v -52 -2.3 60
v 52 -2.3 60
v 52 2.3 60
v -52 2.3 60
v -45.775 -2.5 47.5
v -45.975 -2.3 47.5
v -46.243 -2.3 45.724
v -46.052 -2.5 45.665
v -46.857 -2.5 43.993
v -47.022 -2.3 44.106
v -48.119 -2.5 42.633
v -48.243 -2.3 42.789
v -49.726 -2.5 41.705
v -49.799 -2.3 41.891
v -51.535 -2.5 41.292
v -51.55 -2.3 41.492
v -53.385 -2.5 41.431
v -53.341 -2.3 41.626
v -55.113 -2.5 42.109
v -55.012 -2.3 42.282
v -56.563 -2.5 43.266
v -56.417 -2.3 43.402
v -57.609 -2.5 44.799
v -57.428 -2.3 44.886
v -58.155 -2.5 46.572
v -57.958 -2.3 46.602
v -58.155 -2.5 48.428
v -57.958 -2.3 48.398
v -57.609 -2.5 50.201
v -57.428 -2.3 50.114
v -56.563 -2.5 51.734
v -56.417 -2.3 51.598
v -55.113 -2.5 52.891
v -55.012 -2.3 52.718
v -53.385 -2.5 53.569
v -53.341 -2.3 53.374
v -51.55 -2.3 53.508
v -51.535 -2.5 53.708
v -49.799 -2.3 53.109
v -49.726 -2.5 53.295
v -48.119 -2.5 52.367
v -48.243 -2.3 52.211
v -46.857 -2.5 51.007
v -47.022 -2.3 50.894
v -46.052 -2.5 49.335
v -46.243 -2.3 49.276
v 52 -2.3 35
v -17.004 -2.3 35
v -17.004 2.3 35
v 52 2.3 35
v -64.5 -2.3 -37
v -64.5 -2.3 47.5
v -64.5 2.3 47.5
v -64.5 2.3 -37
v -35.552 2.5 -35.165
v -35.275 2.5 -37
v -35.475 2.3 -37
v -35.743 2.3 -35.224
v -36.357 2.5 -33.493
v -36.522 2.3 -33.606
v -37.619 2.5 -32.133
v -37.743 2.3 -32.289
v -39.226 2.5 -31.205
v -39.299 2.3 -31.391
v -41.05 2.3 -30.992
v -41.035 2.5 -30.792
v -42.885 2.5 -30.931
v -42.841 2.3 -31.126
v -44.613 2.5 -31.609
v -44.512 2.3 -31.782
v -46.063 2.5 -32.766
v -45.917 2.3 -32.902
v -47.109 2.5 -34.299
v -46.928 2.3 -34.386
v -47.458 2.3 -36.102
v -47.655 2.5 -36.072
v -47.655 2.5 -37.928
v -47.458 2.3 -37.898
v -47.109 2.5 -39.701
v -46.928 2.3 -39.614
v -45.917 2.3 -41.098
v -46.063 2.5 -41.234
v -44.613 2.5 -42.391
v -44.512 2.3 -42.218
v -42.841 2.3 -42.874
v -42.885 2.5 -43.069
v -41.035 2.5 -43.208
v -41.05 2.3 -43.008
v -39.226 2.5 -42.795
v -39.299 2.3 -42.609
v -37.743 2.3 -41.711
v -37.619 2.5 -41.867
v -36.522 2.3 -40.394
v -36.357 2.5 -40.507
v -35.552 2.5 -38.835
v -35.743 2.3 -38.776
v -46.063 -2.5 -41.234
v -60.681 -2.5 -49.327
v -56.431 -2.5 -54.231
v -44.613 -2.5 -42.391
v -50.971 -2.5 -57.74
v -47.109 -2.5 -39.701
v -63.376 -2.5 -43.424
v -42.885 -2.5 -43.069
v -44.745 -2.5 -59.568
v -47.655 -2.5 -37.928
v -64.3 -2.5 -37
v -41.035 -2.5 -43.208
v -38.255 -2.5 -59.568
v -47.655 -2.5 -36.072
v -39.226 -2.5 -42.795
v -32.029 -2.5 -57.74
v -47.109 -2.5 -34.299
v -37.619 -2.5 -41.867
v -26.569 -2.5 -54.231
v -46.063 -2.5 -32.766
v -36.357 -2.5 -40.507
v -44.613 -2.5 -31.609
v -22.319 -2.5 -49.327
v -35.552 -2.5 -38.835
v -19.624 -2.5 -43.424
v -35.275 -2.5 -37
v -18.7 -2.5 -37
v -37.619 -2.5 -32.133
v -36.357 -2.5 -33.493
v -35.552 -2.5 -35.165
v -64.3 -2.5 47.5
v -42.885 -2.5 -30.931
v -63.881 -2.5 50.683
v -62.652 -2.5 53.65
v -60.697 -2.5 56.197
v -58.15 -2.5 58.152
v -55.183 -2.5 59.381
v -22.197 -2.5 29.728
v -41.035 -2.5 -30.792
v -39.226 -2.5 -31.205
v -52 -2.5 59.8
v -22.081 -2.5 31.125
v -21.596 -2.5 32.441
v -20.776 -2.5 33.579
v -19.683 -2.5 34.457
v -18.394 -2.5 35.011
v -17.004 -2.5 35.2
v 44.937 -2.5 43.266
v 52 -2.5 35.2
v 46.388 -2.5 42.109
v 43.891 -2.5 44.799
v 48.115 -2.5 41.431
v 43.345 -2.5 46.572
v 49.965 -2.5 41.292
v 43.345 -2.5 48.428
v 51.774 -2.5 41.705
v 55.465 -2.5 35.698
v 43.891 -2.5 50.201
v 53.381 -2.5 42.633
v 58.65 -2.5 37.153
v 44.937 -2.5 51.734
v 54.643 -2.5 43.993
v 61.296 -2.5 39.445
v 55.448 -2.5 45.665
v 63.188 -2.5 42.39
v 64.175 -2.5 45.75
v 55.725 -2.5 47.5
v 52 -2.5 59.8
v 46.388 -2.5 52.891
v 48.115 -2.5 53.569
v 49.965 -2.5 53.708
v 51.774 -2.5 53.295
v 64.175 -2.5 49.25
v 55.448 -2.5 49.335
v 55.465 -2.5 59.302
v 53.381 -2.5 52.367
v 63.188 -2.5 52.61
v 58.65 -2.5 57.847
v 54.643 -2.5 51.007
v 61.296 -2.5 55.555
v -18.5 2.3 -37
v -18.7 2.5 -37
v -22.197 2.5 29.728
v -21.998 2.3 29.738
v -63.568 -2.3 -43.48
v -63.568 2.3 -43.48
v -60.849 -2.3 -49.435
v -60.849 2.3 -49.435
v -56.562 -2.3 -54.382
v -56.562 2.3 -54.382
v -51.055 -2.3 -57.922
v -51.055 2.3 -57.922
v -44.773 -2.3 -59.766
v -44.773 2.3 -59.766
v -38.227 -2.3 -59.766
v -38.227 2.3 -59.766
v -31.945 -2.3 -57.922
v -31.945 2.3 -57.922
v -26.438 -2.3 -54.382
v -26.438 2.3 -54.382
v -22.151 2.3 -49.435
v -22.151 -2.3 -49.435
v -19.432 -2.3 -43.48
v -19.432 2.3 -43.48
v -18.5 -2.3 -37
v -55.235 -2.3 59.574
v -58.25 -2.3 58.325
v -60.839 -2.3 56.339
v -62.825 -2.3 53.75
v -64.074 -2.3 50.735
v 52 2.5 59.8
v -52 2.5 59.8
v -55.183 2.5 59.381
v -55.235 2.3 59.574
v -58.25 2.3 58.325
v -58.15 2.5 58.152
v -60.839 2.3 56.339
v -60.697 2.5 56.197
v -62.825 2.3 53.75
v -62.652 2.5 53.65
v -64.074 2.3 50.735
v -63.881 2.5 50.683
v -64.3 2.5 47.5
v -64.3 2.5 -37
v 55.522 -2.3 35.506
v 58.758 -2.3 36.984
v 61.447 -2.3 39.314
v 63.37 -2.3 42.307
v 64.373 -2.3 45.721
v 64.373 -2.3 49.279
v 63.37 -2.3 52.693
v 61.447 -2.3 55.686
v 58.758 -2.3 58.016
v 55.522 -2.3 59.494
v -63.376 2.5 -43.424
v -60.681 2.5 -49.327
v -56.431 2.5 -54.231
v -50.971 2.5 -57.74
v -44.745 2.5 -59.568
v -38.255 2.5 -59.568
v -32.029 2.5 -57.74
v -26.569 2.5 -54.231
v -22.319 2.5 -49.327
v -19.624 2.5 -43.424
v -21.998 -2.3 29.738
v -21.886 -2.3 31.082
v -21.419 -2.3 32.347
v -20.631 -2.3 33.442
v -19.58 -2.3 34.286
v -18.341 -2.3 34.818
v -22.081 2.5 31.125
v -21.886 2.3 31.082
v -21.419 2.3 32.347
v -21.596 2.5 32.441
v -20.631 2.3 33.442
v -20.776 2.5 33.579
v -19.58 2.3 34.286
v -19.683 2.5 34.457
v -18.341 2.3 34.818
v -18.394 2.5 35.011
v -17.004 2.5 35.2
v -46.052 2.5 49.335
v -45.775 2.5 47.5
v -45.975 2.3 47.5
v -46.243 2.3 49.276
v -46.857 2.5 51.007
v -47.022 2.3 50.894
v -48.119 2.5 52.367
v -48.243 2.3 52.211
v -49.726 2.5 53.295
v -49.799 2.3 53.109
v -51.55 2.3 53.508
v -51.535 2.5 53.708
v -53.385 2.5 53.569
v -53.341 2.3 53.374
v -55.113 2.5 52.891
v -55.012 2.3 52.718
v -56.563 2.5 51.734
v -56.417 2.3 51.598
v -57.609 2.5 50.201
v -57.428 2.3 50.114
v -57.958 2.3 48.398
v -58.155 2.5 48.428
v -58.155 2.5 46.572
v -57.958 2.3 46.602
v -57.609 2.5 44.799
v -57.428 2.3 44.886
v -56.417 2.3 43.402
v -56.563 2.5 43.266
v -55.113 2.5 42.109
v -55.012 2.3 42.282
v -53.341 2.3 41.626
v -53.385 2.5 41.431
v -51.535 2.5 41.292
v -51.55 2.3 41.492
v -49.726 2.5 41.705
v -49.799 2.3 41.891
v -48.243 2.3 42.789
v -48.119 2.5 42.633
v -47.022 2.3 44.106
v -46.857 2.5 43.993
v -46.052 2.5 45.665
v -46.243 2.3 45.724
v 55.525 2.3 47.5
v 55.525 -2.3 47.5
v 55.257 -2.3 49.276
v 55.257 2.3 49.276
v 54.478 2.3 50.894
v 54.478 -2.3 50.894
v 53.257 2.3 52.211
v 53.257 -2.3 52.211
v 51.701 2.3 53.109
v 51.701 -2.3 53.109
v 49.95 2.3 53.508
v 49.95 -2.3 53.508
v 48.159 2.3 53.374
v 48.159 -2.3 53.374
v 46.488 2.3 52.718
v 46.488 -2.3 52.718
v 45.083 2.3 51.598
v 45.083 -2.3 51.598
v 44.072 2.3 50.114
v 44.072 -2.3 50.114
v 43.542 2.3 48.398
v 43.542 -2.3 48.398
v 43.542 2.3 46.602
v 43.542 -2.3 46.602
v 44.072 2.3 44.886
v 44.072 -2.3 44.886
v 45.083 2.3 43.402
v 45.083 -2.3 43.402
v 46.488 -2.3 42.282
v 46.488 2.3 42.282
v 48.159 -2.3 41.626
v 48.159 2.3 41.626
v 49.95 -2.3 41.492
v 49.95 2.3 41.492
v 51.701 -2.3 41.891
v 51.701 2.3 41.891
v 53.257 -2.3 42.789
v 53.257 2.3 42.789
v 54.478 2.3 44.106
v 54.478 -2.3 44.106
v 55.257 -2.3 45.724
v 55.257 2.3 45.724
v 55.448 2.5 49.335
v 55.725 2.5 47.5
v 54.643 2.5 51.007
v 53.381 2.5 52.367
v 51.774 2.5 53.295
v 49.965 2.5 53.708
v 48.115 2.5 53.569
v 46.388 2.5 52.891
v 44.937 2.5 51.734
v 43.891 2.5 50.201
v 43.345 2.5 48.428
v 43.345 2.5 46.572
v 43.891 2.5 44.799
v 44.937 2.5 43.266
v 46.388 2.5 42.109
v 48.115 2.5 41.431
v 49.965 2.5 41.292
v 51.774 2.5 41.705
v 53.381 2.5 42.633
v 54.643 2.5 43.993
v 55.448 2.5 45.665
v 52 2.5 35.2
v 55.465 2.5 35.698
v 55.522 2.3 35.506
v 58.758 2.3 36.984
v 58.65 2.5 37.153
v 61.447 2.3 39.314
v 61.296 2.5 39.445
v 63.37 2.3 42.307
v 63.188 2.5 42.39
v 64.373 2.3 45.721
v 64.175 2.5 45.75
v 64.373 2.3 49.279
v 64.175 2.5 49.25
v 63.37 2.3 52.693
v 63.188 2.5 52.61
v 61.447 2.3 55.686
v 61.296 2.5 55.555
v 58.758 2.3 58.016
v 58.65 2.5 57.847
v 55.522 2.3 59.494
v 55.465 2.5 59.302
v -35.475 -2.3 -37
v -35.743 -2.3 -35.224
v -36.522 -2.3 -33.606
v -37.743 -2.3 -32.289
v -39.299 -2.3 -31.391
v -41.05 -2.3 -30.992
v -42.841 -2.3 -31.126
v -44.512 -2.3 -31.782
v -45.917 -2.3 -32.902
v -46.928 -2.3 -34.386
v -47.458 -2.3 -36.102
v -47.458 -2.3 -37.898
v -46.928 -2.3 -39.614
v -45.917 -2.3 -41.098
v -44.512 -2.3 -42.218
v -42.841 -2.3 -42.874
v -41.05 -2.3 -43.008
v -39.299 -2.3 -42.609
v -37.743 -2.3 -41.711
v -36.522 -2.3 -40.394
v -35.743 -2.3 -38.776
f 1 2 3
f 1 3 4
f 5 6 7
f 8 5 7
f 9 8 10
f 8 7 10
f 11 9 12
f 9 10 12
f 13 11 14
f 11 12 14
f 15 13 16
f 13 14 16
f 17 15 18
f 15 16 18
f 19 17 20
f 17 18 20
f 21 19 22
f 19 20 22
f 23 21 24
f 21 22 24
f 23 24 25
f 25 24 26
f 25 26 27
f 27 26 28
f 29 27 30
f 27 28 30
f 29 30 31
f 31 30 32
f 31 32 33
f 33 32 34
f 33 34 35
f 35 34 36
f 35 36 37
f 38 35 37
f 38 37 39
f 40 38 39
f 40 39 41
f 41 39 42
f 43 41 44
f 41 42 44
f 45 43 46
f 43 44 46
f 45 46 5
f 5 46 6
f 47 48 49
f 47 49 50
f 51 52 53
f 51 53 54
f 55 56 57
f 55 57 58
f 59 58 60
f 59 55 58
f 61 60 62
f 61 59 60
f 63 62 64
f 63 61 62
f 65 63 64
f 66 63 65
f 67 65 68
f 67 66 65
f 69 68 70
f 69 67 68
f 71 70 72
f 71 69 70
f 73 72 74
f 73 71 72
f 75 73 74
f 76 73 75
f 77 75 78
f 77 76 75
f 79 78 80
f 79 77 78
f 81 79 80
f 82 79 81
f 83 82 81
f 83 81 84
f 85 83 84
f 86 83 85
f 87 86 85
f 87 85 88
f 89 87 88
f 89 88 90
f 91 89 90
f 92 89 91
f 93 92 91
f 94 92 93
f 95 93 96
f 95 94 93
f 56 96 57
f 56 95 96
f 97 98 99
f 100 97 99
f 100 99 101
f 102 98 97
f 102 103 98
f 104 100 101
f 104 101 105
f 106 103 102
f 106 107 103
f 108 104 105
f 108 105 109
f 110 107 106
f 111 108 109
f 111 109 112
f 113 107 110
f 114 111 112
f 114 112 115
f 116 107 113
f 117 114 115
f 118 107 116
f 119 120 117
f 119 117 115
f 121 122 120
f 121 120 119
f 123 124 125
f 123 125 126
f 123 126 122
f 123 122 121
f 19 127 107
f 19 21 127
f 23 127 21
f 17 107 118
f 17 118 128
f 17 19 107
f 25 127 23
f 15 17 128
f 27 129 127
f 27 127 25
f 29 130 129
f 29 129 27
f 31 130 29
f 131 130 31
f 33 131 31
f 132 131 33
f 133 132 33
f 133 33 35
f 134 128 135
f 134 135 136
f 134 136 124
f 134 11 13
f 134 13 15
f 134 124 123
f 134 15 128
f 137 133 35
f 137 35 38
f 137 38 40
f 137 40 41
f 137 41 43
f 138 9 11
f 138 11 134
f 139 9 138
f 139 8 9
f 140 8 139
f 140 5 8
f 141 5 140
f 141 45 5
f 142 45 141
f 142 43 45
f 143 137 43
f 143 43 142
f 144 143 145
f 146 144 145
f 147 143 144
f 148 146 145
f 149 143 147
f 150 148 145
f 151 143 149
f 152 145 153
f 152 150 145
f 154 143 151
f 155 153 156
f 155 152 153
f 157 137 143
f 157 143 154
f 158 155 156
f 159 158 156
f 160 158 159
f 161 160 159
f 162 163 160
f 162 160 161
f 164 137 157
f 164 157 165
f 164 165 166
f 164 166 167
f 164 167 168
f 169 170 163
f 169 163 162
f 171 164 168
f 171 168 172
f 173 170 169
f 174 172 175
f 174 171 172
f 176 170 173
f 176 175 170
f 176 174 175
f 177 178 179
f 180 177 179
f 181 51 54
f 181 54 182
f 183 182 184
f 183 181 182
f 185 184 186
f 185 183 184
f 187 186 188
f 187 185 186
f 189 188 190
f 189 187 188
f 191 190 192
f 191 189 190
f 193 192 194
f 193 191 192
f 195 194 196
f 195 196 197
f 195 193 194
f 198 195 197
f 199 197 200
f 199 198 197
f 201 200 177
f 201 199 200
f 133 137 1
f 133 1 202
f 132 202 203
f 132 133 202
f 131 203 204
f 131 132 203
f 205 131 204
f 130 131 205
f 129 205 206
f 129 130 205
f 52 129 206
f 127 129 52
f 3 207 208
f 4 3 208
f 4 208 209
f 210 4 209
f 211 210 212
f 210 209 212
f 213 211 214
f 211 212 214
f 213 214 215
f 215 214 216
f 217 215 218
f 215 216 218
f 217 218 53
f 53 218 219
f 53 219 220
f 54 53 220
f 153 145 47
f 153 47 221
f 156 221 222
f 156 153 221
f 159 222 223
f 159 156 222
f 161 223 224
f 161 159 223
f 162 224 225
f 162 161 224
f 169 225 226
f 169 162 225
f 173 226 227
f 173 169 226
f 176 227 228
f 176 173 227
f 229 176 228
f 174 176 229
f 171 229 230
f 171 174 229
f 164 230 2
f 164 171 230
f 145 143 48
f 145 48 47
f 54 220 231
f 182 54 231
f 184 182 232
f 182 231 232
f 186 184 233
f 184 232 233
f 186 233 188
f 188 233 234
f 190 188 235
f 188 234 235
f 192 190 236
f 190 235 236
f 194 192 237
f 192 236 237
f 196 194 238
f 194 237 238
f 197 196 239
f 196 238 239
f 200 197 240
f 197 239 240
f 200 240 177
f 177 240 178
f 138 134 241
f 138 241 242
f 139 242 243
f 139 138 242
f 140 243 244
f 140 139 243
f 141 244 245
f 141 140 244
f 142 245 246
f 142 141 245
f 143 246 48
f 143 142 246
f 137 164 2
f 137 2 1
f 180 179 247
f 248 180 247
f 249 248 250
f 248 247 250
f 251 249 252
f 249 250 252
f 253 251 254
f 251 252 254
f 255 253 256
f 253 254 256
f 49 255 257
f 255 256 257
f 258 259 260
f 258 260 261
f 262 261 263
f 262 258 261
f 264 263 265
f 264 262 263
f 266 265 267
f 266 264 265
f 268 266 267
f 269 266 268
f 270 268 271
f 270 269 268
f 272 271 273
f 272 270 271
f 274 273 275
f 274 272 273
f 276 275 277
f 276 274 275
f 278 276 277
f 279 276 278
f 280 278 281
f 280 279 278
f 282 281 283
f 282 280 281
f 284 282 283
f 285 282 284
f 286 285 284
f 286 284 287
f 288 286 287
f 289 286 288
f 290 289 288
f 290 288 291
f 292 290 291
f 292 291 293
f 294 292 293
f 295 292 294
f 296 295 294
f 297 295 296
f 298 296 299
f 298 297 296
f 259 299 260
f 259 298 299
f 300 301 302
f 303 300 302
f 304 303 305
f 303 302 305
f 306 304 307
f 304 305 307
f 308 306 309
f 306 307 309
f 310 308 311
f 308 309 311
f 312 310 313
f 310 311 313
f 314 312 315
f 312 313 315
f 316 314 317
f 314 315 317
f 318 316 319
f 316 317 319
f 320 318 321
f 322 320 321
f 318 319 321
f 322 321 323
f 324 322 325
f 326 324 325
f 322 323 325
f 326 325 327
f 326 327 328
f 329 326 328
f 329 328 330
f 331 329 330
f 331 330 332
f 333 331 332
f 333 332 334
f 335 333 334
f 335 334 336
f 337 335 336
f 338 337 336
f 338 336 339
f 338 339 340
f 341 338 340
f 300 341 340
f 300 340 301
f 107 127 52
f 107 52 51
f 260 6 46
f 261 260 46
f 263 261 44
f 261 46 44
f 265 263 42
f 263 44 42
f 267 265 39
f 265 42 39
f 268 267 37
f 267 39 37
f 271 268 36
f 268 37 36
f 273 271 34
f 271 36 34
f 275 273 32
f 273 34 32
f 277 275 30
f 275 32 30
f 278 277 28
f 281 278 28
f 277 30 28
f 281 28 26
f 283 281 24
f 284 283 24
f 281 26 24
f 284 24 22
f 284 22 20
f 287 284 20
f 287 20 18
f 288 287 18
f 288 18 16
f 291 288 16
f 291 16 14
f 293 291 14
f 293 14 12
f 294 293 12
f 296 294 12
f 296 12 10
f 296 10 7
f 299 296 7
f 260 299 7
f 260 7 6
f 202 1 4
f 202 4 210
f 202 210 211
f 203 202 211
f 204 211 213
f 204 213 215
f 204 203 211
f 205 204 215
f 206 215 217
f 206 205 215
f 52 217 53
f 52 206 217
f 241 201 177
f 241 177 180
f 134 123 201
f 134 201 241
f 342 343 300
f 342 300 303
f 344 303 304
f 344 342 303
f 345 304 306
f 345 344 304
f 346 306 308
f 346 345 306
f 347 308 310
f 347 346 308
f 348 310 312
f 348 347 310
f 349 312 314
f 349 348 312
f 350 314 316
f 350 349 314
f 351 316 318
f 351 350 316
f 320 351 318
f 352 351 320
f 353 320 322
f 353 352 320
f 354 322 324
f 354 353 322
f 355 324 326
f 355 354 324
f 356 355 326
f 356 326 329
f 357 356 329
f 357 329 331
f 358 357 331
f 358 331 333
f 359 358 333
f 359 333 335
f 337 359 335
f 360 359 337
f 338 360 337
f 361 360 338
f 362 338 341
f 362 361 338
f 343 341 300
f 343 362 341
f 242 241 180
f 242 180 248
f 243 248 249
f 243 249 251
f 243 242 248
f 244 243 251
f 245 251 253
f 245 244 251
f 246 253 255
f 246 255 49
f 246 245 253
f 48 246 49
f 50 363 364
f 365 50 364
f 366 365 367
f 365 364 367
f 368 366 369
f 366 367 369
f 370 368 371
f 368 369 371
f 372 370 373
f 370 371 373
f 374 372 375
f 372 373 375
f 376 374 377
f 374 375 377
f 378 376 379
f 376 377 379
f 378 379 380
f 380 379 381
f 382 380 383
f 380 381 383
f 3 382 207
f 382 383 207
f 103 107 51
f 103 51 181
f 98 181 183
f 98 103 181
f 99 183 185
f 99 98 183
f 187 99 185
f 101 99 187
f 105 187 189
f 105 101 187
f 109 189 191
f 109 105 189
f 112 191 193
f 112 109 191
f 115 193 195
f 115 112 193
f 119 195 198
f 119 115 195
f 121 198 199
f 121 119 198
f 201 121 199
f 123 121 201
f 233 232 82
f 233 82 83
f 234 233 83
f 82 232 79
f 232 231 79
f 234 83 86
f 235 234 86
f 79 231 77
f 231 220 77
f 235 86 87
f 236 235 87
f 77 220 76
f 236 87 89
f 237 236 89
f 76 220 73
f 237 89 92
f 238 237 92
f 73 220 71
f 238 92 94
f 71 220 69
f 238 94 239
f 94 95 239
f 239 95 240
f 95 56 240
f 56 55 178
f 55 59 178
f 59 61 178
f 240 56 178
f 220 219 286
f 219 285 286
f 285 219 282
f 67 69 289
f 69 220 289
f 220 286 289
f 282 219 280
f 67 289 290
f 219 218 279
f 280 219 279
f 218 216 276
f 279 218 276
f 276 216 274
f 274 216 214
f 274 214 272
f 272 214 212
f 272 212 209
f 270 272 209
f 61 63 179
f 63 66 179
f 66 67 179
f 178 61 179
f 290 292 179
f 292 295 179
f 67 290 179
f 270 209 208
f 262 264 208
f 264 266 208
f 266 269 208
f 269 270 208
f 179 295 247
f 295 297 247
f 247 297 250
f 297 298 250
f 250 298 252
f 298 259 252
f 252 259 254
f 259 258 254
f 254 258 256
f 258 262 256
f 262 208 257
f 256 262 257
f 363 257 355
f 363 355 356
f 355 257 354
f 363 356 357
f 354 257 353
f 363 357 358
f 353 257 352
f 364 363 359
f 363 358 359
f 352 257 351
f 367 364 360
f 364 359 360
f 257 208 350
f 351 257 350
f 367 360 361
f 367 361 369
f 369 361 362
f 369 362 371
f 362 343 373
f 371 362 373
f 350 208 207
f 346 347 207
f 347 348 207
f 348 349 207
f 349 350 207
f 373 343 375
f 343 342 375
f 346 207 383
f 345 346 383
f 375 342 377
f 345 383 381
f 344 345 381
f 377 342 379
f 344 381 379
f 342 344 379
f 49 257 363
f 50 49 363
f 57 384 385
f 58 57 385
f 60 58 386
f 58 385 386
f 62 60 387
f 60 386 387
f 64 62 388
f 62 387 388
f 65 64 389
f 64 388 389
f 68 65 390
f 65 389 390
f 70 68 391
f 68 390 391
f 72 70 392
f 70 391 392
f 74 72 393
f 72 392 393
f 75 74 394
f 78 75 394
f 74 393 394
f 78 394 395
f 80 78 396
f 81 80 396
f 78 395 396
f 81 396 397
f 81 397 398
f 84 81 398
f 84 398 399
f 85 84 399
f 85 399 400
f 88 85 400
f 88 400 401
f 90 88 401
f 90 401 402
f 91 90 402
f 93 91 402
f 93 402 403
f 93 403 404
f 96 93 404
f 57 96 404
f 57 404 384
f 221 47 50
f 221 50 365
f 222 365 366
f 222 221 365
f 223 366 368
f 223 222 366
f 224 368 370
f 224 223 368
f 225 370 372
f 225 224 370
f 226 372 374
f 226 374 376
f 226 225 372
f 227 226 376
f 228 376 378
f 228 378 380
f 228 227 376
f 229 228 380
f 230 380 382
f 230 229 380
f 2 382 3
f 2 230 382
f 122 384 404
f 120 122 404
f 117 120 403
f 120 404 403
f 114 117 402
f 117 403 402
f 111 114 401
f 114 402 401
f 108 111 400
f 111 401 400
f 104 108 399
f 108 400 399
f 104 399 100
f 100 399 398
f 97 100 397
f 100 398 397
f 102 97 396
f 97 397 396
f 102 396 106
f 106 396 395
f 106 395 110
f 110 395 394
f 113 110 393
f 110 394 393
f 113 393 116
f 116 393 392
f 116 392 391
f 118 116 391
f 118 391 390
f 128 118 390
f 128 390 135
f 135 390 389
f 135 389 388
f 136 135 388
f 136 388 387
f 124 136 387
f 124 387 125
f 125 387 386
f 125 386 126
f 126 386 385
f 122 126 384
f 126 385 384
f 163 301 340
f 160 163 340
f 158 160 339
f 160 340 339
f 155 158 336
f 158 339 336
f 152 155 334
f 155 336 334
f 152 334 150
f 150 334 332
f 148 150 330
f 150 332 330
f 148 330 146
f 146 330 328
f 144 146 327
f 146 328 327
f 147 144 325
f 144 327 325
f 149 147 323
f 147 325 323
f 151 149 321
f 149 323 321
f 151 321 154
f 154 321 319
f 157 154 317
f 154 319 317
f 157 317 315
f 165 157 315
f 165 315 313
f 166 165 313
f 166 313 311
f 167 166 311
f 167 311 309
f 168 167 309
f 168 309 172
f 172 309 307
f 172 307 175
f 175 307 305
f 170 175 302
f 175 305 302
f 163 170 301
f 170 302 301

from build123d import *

# Parameters (mm, degrees)
F1_DEPTH      = 2.5
F2_R          = 6.025
F3_DEPTH      = 25
F3_DEPTH_BACK = 25
F4_SIZE       = 0.2


with BuildPart() as f1:
    # F0 (on Front) → F1 (new body, symmetric)
    with BuildSketch(Plane.XZ):
        with BuildLine():
            Line((-64.5, 47.5), (-64.5, -37))
            ThreePointArc((-64.5, -37), (-41.5000010456, -60), (-18.5, -37.0000020911))
            Line((-18.5, -37.0000020911), (-21.9976072653, 29.7383202188))
            ThreePointArc((-21.9976072653, 29.7383202188), (-20.6313314466, 33.4417728785), (-17.0044595916, 35))
            Line((-17.0044595916, 35), (52, 35))
            ThreePointArc((52, 35), (64.5, 47.5), (52, 60))
            Line((52, 60), (-52, 60))
            ThreePointArc((-52, 60), (-60.8388347648, 56.3388347648), (-64.5, 47.5))
        make_face()
    extrude(amount=F1_DEPTH, both=True)

    # F2 (on Front) → F3 (cut, two sides)
    with BuildSketch(Plane.XZ) as f3_sk:
        with Locations((-41.5, -37)):
            Circle(F2_R)
        with Locations((-52, 47.5)):
            Circle(F2_R)
        with Locations((49.5, 47.5)):
            Circle(F2_R)
    extrude(amount=-F3_DEPTH, mode=Mode.SUBTRACT)
    extrude(f3_sk.sketch, amount=F3_DEPTH_BACK, mode=Mode.SUBTRACT)

    # F4
    f4_edges = [f1.edges().sort_by_distance(p)[0] for p in [
        (-20.631331, -2.5, 33.441773),
        (-20.248804, -2.5, -3.630841),
        (17.49777, -2.5, 35),
        (-41.500001, -2.5, -60),
        (64.5, -2.5, 47.5),
        (-64.5, -2.5, 5.25),
        (0, -2.5, 60),
        (-60.838835, -2.5, 56.338835),
        (-47.525, -2.5, -37),
        (-58.025, -2.5, 47.5),
        (43.475, -2.5, 47.5),
        (-20.631331, 2.5, 33.441773),
        (-20.248804, 2.5, -3.630841),
        (17.49777, 2.5, 35),
        (-41.500001, 2.5, -60),
        (64.5, 2.5, 47.5),
        (-64.5, 2.5, 5.25),
        (0, 2.5, 60),
        (-60.838835, 2.5, 56.338835),
        (-47.525, 2.5, -37),
        (-58.025, 2.5, 47.5),
        (43.475, 2.5, 47.5),
    ]]
    chamfer(f4_edges, length=F4_SIZE)


solid = f1.part
